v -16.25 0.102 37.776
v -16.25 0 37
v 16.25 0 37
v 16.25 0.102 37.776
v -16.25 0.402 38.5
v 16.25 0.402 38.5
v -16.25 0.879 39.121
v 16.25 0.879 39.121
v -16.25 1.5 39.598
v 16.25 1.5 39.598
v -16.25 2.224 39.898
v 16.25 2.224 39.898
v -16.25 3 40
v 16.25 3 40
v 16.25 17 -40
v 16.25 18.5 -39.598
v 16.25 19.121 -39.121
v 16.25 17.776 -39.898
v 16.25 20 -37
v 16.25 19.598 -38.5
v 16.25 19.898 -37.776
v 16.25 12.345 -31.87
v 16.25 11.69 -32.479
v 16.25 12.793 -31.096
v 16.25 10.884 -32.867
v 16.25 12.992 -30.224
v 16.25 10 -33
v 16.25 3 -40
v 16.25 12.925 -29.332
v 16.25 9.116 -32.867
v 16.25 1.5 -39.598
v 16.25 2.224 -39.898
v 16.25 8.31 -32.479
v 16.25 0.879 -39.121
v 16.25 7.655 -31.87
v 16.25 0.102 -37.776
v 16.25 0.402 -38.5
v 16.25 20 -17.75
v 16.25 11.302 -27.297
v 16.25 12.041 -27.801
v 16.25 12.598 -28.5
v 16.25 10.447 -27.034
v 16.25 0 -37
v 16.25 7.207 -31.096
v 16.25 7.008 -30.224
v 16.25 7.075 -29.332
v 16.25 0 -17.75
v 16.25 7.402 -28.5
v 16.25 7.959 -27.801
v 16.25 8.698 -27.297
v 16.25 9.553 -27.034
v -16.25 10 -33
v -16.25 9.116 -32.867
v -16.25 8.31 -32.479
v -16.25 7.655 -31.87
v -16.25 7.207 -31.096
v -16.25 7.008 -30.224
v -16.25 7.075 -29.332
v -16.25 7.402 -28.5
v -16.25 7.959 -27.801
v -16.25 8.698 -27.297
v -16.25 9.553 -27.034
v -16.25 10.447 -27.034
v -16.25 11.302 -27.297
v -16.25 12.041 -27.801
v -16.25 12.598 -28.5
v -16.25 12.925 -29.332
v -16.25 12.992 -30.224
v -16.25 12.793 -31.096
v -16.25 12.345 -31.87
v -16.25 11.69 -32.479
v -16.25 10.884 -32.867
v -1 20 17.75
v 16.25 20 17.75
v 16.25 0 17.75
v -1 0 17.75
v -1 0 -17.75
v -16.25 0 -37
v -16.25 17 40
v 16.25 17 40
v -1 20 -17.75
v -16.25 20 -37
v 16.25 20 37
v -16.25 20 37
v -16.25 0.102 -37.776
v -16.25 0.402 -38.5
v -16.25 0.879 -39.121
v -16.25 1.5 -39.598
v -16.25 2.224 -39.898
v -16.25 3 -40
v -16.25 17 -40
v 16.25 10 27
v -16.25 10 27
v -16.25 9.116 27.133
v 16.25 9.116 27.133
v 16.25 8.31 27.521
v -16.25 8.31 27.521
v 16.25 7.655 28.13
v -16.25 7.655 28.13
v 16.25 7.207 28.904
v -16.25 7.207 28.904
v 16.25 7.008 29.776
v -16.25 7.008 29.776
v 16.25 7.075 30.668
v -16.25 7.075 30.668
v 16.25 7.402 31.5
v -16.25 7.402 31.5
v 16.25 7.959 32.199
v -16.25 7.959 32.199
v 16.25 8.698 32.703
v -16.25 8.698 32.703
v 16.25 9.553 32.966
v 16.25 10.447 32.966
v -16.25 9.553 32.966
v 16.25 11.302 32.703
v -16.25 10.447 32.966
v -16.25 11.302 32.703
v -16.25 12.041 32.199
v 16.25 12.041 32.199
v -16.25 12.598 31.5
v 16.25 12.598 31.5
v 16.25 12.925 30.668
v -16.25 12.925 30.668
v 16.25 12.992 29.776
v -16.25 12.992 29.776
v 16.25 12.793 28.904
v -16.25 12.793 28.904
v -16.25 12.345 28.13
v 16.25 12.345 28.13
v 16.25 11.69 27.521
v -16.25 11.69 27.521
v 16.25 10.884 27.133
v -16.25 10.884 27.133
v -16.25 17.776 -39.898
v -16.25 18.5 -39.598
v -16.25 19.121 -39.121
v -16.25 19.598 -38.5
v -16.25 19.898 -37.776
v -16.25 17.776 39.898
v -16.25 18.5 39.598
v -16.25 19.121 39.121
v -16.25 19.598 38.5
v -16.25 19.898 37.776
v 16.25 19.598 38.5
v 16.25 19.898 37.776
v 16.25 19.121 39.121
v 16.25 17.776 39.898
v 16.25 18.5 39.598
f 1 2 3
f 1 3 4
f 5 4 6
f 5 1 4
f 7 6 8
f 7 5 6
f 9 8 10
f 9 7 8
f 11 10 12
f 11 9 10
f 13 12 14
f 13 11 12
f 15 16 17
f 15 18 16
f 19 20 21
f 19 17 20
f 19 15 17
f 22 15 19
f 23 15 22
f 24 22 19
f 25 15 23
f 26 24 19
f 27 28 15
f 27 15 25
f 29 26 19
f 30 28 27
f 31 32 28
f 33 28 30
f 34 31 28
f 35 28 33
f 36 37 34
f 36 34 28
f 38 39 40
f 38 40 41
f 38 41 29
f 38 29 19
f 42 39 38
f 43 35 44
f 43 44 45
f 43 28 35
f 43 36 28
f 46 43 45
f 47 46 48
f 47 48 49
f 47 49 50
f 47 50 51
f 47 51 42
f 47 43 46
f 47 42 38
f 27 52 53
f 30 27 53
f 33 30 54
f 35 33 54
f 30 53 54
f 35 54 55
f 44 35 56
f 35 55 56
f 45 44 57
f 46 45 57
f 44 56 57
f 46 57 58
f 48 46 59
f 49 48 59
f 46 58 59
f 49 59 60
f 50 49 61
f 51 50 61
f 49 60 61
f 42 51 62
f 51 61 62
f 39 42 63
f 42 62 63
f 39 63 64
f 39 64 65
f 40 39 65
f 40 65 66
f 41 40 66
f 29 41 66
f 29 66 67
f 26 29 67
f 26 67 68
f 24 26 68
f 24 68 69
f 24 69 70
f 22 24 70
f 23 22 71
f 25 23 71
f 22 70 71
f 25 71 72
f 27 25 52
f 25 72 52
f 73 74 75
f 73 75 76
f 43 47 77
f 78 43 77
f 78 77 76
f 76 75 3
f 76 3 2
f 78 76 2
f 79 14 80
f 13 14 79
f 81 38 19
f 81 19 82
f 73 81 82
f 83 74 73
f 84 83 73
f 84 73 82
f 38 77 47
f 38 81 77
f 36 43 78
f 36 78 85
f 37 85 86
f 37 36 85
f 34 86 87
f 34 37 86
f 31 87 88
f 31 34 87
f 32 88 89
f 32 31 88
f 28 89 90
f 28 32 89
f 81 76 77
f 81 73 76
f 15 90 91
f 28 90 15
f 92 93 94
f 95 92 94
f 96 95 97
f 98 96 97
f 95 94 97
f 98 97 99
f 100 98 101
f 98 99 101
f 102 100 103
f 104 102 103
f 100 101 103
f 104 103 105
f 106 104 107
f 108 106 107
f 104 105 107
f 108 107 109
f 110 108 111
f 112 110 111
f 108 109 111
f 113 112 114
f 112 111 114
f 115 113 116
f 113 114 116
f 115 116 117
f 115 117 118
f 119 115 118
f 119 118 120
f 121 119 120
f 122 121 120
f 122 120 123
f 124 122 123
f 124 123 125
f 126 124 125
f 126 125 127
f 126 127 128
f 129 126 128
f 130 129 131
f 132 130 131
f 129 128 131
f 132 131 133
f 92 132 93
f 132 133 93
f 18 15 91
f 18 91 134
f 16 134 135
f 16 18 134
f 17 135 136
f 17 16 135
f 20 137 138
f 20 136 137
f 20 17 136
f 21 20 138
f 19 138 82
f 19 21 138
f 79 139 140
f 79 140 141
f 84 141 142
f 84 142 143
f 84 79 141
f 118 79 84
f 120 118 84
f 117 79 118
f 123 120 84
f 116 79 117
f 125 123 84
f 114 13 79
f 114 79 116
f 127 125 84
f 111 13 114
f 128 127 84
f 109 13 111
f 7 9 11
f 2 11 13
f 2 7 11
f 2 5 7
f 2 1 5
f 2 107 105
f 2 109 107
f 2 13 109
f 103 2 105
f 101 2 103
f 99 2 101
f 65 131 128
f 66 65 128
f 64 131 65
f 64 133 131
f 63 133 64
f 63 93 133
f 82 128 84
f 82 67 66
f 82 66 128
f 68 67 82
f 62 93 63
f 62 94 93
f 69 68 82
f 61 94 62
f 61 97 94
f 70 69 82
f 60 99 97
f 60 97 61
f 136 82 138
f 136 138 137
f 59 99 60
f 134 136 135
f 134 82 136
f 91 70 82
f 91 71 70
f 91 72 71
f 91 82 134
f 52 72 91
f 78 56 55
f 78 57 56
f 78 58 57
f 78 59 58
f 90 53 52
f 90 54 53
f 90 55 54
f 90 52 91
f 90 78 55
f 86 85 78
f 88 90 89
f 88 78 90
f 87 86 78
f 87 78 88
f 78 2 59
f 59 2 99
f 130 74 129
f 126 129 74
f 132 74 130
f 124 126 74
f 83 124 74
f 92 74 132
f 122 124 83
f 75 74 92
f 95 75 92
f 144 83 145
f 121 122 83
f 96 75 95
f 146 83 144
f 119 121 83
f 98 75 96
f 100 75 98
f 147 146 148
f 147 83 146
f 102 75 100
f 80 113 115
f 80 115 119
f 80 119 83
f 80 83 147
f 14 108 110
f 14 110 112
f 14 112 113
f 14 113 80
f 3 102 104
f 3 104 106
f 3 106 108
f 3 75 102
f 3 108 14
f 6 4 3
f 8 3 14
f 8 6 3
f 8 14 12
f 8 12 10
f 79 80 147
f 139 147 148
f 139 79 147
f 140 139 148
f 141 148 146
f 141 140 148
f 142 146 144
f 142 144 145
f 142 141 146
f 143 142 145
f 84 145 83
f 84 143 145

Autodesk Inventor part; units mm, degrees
ref_plane "YZ Plane" through (0, 0, 0) normal (1, 0, 0) x (0, 1, 0)
ref_plane "XZ Plane" through (0, 0, 0) normal (0, 1, 0) x (-1, 0, 0)
ref_plane "XY Plane" through (0, 0, 0) normal (0, 0, 1) x (1, 0, 0)
sketch "Sketch1" plane through (0, 0, 0) normal (0, 1, 0) x (-1, 0, 0)
  line L0 (-16.25, 40) -> (16.25, 40)
  line L1 (16.25, 40) -> (16.25, -40)
  line L2 (16.25, -40) -> (-16.25, -40)
  line L3 (-16.25, -40) -> (-16.25, 40)
  point P0 (0, 0)
  dimension "d0" = 80
  dimension "d1" = 32.5
  dimension "d2" = 40
  dimension "d3" = 16.25
extrude "Extrusion1" add sketch "Sketch1" along normal blind 20
sketch "Sketch2" plane through (16.25, 0, 40) normal (1, 0, 0) x (0, 0, -1)
  line L0 (0, 0) -> (80, 0) projected
  line L1 (80, 0) -> (80, 20) projected
  line L2 (0, 20) -> (80, 20) projected
  line L3 (0, 0) -> (0, 20) projected
  point P0 (40, 0)
  point P1 (10, 10)
  point P2 (70, 10)
  dimension "d8" = 10
  dimension "d9" = 10
  dimension "d10" = 10
  dimension "d11" = 10
hole "Hole1" at (16.25, 10, 30) at (16.25, 10, -30) direction (-1, 0, 0) diameter 6 end through all
sketch "Sketch3" plane through (0, 20, 0) normal (0, 1, 0) x (1, 0, 0)
  line L0 (16.25, -40) -> (16.25, 40) projected
  line L1 (16.25, 40) -> (-16.25, 40) projected
  line L2 (-16.25, 40) -> (-16.25, -40) projected
  line L3 (-16.25, -40) -> (16.25, -40) projected
  line L4 (16.25, -17.75) -> (-1, -17.75)
  line L5 (-1, -17.75) -> (-1, 17.75)
  line L6 (-1, 17.75) -> (16.25, 17.75)
  point P0 (0, 0)
  dimension "d19" = 17.25
  dimension "d20" = 35.5
  dimension "d21" = 17.75
extrude "Extrusion2" cut sketch "Sketch3" against normal through all contours L4 L5 L6 L0
fillet "Fillet1" radius 3 4 edges at (0, 20, 40) (0, 0, 40) (0, 20, -40) (0, 0, -40)
equation "\"d2\" = 0.5 * d0"
equation "\"d3\" = 0.5 * d1"
equation "\"d9\" = d8"
equation "\"d21\" = 0.5 * d20"
properties part number "3DP_ASA_Balcony_Mounting_Clamp_Back"
